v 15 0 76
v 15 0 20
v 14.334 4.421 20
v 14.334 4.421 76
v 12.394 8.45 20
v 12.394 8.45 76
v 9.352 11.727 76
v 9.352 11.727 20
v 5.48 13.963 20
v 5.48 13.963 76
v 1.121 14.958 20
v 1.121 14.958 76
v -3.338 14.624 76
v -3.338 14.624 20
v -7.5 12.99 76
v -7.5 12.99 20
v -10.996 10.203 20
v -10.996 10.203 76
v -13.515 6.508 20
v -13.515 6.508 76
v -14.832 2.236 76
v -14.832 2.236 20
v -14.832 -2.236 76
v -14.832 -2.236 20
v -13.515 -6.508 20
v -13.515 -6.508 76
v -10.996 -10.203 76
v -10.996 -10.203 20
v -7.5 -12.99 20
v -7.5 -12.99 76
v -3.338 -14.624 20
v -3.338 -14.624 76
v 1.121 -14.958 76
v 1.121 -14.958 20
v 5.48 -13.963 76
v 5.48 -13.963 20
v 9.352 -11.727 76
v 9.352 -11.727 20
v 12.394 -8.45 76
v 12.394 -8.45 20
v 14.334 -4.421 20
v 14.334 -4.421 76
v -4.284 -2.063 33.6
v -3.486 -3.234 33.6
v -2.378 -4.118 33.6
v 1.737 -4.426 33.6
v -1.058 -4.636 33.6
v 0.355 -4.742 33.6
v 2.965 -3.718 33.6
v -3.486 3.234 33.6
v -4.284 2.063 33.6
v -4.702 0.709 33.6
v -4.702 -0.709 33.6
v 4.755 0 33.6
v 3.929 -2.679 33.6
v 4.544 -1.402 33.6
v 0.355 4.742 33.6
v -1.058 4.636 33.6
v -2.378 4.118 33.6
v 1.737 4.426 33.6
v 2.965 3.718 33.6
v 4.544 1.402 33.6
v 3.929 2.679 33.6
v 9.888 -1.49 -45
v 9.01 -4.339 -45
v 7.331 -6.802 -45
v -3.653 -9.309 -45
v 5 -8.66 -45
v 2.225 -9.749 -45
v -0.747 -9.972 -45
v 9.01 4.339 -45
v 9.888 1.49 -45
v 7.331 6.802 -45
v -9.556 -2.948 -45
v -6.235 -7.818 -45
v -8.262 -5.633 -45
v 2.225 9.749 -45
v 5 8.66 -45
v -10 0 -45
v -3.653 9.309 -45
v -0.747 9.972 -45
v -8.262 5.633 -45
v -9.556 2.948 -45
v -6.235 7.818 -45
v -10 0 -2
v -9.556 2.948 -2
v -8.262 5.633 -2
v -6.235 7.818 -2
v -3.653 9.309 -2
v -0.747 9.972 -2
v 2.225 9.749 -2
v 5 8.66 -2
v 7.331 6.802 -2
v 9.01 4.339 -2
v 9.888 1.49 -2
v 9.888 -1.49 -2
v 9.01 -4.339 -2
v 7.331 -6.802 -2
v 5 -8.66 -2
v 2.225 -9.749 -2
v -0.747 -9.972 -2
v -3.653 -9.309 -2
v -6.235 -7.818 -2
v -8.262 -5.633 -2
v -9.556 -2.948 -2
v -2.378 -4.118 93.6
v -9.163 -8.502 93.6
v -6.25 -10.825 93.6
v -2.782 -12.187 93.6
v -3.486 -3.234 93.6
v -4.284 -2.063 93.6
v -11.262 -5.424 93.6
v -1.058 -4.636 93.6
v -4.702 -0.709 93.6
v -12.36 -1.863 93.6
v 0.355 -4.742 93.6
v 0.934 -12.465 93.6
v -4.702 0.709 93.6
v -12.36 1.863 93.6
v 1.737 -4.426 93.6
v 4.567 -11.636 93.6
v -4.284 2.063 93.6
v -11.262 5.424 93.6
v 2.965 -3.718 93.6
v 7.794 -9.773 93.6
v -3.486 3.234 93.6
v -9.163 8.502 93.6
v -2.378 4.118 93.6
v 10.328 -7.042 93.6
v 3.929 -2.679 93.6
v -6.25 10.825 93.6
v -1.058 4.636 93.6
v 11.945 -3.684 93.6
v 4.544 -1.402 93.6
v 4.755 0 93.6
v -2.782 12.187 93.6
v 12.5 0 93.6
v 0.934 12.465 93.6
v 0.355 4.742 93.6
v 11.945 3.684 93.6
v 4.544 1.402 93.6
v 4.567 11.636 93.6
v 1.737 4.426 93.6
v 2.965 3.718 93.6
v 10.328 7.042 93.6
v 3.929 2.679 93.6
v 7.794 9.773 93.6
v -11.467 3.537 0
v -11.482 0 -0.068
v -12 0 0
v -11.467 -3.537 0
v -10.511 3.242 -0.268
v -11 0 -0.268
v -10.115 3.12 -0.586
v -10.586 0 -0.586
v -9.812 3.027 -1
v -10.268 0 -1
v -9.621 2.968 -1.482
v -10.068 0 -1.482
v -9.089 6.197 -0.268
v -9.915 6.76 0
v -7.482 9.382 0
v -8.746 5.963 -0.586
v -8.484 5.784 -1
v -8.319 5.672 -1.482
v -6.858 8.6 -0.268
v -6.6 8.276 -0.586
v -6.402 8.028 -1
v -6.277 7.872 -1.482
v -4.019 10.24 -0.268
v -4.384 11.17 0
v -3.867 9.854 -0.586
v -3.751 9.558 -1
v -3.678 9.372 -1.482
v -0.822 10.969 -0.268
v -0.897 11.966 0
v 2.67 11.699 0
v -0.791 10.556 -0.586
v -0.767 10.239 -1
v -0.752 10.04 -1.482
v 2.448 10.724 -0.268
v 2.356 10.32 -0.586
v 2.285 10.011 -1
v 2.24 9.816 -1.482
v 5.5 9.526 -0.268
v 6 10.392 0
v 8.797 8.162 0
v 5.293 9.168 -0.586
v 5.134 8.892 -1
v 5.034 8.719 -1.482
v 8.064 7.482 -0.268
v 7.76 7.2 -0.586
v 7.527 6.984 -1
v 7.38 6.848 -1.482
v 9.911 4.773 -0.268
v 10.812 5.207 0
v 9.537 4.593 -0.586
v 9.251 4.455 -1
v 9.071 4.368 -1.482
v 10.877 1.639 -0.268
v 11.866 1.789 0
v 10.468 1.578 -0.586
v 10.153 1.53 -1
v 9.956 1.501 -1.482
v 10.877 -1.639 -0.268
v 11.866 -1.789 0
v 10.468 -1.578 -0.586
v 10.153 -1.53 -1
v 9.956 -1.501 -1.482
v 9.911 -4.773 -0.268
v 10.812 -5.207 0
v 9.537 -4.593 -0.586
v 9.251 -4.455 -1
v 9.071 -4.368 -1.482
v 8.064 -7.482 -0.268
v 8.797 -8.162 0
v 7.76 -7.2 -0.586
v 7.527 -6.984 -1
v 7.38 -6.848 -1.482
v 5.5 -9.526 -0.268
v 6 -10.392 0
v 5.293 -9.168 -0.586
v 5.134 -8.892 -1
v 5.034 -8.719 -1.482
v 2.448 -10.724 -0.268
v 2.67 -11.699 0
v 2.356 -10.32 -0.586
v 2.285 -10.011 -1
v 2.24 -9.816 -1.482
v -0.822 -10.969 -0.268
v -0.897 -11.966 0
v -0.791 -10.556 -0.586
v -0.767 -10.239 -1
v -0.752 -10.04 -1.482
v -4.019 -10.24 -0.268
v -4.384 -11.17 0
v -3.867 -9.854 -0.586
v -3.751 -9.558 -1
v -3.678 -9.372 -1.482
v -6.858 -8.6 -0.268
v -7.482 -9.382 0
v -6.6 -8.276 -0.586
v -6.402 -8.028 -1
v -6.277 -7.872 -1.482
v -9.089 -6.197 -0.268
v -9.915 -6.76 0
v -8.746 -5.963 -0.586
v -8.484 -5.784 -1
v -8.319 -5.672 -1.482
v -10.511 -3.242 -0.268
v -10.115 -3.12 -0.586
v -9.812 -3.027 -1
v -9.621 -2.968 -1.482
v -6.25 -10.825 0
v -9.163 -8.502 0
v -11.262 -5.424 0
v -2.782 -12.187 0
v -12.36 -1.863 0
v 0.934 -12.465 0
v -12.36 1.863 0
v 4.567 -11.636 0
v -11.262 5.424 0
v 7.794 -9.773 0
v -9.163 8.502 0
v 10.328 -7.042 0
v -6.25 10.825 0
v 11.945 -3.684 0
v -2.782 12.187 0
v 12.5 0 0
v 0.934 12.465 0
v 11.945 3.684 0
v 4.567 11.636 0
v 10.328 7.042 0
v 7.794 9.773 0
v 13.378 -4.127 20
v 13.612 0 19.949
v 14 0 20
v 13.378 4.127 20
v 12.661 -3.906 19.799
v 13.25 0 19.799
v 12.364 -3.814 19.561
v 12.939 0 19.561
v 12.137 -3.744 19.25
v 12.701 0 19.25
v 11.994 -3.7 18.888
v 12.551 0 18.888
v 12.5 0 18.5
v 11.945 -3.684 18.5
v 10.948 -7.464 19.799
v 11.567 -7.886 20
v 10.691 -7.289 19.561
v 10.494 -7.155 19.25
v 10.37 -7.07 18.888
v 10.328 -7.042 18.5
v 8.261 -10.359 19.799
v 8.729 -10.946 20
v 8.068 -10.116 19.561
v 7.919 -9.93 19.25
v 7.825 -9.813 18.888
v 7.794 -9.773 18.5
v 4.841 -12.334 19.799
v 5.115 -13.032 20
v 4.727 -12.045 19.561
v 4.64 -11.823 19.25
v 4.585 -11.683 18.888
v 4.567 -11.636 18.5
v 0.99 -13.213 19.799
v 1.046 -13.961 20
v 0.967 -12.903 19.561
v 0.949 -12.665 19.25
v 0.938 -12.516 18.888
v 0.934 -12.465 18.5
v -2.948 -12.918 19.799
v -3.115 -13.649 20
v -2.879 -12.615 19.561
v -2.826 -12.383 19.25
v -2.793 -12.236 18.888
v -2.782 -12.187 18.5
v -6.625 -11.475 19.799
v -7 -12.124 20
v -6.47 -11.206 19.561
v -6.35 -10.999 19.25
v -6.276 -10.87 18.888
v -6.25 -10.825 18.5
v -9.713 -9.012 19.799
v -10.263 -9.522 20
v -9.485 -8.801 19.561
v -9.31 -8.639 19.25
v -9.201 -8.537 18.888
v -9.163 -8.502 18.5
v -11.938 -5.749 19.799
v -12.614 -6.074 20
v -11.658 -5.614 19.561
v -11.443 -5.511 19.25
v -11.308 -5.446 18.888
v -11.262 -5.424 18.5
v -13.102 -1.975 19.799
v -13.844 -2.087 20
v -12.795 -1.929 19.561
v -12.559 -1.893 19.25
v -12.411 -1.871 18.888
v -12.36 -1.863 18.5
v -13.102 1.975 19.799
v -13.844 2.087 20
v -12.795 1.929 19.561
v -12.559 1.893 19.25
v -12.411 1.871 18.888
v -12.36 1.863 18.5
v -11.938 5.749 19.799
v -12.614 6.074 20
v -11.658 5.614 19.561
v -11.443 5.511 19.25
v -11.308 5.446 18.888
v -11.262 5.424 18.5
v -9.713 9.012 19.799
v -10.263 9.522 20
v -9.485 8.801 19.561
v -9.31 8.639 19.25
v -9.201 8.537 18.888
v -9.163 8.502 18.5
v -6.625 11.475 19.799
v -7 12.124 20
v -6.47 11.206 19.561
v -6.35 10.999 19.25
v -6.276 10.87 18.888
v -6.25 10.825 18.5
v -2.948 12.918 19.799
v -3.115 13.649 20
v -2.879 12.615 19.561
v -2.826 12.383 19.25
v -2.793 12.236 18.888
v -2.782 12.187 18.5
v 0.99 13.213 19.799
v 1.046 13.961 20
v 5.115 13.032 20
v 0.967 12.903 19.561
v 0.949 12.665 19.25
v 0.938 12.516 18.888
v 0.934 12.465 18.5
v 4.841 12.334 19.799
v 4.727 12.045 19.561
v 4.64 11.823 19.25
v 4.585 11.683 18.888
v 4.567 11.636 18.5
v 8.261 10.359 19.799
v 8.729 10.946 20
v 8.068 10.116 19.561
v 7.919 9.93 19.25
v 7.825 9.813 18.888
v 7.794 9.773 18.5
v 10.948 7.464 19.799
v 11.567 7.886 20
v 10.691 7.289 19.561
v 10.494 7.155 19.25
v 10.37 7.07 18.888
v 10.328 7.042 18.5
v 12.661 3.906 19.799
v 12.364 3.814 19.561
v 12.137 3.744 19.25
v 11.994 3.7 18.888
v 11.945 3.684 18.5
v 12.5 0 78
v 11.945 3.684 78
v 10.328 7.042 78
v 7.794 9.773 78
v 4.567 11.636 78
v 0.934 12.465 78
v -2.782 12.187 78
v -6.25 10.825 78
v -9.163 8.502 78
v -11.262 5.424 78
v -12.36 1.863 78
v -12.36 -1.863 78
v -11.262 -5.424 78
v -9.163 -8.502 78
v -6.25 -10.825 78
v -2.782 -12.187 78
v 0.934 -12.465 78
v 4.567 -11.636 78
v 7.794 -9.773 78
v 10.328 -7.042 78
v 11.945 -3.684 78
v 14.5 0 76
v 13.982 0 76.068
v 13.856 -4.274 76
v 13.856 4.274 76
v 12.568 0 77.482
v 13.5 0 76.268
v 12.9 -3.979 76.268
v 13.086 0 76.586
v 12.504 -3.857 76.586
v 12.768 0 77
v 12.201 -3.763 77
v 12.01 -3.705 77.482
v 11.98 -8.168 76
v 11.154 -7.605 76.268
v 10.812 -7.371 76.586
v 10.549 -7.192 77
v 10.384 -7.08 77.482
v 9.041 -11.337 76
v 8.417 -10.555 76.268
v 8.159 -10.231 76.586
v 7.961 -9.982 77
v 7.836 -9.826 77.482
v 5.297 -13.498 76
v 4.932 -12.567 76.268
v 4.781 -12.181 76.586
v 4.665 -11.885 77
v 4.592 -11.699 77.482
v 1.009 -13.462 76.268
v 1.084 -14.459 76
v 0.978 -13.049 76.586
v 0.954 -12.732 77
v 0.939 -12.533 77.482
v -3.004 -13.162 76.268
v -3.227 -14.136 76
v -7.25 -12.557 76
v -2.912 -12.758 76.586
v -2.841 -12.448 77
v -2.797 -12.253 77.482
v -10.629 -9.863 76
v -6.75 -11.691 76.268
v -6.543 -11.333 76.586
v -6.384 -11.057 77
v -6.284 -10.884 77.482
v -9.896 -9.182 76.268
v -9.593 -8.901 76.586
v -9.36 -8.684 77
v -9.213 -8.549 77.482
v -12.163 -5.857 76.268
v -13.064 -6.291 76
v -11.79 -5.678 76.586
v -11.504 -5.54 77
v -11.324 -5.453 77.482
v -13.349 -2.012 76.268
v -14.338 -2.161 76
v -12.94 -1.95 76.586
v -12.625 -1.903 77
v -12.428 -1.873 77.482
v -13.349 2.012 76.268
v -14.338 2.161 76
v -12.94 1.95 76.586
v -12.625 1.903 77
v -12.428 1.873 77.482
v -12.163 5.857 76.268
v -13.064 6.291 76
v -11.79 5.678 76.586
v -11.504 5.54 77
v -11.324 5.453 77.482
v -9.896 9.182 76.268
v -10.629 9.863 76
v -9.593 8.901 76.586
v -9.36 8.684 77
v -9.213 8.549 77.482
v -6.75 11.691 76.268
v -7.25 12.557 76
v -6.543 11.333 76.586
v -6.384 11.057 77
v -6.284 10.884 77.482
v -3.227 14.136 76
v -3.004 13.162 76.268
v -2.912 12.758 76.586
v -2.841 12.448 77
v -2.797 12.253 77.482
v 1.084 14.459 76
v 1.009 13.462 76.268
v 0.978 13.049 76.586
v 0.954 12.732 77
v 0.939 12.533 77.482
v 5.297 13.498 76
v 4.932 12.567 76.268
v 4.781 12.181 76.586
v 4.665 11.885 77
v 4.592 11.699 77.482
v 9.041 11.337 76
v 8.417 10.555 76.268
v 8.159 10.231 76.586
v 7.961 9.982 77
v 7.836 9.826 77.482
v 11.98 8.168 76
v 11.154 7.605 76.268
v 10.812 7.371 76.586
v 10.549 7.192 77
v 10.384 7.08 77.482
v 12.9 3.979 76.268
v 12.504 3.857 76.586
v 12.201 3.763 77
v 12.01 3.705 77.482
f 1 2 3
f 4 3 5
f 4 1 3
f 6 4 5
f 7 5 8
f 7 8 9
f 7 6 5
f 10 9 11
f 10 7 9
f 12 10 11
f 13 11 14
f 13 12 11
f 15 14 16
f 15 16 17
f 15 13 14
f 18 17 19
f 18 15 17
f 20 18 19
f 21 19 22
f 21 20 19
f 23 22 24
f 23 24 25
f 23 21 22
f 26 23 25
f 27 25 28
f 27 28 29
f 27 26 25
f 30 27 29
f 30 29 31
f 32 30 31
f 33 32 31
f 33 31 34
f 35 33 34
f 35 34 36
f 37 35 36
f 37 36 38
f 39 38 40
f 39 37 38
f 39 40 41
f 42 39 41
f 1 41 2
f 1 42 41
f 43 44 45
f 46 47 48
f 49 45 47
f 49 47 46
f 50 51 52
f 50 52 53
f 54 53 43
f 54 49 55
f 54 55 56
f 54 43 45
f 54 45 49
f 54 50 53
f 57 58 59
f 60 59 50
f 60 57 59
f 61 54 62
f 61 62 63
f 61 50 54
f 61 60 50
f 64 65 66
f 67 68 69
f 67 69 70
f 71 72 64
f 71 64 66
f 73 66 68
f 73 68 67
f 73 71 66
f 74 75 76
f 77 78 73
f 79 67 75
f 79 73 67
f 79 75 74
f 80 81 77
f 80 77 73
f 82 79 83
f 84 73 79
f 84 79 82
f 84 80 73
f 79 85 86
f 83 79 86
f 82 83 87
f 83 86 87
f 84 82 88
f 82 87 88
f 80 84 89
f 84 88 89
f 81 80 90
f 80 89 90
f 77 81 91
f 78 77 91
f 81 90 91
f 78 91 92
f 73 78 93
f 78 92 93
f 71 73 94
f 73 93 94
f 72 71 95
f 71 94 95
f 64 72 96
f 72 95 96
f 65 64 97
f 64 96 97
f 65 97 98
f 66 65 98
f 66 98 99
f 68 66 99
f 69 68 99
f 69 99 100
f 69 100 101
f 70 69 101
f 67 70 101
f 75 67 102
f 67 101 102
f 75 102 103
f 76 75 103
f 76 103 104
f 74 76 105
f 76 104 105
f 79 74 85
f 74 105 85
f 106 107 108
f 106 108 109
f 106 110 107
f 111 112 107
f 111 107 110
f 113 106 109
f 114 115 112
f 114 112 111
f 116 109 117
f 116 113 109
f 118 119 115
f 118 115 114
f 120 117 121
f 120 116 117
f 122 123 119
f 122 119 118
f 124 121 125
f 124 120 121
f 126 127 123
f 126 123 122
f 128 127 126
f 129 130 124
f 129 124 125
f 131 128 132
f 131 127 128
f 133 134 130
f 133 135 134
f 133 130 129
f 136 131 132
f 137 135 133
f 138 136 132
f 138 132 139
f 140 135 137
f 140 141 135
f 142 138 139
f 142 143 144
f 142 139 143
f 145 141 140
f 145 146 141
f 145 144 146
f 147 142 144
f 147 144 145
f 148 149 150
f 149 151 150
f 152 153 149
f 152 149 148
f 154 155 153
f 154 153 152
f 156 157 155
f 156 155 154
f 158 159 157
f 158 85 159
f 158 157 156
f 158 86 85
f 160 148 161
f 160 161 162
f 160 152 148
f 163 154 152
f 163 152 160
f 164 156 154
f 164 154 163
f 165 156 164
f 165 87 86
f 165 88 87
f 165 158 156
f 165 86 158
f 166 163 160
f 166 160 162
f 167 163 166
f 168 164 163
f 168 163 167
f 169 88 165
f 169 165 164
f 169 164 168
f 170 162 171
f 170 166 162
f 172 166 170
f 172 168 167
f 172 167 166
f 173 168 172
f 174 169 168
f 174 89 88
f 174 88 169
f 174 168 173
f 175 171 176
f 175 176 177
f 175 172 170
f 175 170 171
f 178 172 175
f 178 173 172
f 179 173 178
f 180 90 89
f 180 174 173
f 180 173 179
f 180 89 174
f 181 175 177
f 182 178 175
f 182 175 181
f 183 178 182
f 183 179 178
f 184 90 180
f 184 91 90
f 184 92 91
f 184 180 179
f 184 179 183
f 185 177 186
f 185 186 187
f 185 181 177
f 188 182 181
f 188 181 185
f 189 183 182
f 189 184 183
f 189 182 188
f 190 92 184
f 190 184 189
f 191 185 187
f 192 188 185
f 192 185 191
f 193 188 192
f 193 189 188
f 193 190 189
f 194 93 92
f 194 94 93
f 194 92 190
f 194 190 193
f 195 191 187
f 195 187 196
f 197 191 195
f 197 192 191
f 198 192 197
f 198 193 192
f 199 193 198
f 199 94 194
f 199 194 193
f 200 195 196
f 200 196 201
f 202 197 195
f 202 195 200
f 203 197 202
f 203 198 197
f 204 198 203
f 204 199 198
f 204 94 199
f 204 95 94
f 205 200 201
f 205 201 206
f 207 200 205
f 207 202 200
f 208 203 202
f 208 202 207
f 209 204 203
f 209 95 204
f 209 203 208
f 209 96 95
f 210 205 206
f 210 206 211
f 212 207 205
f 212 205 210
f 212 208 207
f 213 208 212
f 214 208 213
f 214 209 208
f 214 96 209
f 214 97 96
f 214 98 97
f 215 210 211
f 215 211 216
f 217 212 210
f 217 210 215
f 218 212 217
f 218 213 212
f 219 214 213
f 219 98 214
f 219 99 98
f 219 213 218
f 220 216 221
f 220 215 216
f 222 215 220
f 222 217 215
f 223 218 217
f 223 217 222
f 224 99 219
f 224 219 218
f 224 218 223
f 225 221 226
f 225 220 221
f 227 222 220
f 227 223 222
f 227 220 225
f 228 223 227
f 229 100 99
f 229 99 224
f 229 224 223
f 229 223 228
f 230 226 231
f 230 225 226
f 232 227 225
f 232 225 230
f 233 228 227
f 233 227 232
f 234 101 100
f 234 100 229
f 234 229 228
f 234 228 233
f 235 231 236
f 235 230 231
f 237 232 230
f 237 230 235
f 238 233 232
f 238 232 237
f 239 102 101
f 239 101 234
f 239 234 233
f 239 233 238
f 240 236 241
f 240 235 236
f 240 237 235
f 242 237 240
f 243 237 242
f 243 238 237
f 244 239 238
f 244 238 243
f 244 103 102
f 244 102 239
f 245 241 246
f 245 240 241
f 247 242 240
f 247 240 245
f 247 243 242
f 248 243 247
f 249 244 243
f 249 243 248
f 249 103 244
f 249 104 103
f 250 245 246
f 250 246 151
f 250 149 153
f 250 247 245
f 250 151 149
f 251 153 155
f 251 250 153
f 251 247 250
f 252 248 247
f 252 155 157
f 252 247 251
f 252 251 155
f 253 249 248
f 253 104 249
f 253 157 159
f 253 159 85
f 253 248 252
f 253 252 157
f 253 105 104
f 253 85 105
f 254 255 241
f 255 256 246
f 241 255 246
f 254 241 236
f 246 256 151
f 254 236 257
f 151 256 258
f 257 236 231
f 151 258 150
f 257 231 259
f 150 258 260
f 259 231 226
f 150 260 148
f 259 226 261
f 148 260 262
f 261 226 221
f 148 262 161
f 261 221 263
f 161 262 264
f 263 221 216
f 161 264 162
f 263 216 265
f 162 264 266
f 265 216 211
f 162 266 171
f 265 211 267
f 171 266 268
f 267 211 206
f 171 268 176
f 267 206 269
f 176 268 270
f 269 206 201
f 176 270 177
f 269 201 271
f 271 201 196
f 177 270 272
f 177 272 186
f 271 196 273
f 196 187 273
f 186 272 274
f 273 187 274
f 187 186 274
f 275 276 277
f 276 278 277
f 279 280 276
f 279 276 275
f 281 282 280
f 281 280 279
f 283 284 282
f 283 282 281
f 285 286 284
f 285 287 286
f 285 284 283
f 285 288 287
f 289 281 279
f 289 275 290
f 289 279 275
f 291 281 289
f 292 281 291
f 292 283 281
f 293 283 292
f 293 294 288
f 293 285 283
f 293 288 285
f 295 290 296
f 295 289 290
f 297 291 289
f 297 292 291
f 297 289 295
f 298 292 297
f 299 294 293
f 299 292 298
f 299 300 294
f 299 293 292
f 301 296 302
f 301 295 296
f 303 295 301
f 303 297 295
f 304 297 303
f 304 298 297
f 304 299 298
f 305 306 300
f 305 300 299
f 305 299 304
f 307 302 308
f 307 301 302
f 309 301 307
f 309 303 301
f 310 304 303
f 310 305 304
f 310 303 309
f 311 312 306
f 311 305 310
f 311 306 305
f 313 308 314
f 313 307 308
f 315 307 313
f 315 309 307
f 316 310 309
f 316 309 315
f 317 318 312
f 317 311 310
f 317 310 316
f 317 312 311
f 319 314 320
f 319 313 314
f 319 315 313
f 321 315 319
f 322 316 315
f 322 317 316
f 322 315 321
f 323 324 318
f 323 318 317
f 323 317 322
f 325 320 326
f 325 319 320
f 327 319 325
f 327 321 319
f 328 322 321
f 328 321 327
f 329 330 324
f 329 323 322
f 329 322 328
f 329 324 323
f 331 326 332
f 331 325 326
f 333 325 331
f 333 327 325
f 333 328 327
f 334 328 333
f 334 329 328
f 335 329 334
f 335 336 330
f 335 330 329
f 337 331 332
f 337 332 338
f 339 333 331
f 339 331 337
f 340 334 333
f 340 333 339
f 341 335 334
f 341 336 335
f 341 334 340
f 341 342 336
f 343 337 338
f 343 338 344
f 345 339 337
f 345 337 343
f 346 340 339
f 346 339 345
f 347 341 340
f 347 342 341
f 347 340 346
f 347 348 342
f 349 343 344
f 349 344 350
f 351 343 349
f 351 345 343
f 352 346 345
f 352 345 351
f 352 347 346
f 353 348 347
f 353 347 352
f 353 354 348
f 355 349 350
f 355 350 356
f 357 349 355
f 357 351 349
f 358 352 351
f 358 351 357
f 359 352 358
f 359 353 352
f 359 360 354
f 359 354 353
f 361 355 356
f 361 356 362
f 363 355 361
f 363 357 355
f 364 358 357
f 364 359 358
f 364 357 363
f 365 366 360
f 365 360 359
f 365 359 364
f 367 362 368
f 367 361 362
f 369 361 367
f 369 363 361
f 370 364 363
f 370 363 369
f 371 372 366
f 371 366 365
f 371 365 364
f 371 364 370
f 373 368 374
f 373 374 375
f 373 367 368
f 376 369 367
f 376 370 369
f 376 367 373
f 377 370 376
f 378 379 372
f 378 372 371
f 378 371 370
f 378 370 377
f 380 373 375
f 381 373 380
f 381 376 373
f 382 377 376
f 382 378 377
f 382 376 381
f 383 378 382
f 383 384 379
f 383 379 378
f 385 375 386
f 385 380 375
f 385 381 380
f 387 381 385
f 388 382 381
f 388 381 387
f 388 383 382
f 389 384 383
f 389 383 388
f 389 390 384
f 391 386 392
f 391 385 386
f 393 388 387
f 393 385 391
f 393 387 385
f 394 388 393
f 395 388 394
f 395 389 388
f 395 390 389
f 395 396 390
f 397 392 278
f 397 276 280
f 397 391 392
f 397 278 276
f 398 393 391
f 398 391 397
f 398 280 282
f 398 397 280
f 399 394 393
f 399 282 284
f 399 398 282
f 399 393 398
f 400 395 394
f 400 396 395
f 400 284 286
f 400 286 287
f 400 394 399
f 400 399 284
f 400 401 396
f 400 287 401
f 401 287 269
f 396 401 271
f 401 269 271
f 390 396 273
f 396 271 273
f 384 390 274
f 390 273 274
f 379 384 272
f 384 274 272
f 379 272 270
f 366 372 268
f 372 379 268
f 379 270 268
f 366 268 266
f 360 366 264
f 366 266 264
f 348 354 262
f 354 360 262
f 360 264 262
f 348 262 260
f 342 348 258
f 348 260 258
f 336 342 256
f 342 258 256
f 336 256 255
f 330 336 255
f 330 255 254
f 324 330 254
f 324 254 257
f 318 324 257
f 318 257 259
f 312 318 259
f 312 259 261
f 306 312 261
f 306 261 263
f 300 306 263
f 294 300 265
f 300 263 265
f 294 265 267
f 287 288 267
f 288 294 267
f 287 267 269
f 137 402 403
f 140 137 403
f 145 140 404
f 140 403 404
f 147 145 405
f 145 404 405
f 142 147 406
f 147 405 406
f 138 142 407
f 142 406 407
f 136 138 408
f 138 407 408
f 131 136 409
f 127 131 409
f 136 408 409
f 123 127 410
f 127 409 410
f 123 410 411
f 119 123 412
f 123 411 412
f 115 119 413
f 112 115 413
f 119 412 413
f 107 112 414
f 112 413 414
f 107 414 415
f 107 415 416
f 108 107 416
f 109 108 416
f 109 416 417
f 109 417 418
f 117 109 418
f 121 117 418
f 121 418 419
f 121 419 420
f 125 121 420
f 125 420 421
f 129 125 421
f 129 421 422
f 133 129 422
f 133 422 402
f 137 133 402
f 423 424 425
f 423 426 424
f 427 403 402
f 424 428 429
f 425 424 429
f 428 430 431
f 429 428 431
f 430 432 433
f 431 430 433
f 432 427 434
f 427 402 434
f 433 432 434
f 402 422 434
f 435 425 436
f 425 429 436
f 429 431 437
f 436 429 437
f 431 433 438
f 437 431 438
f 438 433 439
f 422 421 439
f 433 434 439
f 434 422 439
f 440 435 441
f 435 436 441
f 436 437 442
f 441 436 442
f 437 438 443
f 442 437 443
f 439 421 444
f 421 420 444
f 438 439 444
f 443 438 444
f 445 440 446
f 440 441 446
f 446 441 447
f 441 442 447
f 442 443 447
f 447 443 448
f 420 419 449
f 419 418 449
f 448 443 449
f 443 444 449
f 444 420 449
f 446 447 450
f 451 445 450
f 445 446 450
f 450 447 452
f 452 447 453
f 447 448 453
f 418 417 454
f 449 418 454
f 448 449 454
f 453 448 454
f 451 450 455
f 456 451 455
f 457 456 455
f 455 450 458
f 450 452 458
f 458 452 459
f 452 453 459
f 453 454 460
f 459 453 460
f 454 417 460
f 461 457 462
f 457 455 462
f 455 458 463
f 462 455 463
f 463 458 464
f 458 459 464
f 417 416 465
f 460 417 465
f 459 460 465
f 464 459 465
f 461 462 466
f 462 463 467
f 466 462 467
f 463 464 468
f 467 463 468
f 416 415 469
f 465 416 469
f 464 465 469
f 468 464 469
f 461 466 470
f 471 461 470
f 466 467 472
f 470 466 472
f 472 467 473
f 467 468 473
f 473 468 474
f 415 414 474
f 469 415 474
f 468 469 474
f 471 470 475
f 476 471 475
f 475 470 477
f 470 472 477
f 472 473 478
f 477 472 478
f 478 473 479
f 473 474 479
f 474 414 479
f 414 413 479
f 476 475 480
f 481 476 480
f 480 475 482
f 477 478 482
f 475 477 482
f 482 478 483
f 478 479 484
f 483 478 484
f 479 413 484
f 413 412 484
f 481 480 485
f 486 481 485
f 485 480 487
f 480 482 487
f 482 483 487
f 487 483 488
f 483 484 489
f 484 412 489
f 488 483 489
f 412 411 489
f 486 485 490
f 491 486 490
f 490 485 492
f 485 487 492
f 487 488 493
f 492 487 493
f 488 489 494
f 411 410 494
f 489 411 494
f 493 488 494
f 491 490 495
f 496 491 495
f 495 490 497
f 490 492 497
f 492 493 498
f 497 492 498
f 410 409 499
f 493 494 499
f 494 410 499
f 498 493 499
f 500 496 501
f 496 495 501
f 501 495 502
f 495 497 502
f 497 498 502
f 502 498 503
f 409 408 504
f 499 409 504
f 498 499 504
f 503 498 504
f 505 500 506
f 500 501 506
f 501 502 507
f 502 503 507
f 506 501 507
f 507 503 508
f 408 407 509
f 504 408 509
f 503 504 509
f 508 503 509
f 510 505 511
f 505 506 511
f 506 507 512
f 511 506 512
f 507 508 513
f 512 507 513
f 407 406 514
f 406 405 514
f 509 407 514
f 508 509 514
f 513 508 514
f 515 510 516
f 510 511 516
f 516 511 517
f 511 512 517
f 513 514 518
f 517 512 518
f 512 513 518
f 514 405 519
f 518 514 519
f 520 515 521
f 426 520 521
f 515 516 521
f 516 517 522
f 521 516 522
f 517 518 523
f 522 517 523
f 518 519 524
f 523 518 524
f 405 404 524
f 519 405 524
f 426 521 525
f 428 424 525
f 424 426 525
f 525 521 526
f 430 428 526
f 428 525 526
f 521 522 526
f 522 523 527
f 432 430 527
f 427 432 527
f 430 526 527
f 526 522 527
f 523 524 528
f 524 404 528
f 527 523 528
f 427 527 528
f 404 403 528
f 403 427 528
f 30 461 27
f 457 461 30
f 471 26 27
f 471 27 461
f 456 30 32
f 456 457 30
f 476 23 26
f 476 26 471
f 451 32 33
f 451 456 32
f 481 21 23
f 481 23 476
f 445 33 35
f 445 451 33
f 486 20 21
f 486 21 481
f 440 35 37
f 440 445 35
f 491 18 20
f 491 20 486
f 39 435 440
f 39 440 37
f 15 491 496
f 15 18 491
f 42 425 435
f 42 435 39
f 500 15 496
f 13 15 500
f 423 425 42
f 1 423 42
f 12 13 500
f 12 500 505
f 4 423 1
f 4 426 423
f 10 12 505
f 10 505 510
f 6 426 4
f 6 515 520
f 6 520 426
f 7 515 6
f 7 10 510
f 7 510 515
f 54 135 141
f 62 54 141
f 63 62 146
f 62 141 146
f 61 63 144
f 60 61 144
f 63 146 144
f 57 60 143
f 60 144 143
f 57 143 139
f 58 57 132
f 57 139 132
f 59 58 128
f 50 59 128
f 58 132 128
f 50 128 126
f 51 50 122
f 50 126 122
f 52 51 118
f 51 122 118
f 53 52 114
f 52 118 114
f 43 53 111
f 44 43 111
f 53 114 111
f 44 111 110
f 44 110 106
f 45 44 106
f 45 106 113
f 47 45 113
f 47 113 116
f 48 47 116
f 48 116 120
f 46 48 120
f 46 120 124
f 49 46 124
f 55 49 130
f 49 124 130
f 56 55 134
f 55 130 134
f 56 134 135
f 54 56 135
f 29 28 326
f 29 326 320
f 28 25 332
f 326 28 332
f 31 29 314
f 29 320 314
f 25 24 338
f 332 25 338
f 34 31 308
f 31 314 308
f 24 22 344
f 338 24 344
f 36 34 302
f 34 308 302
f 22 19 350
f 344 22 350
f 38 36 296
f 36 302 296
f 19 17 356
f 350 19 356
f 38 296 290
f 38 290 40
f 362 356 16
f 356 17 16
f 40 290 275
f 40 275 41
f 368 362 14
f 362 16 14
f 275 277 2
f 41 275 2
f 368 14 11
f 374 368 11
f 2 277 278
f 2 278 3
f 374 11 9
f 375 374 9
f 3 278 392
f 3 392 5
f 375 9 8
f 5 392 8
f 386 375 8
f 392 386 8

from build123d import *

# Parameters (mm, degrees)
SKETCH1_R           = 12.5
BOSS_EXTRUDE1_DEPTH = 93.6
SKETCH2_R           = 15
BOSS_EXTRUDE2_DEPTH = 56
SKETCH3_R           = 10
BOSS_EXTRUDE3_DEPTH = 45
SKETCH4_R           = 4.755
CUT_EXTRUDE1_DEPTH  = 60
FILLET2_R           = 2
FILLET3_R           = 1.5
FILLET4_R           = 2


with BuildPart() as part:
    # Sketch1 → Boss-Extrude1 (new body)
    with BuildSketch(Plane.XY):
        Circle(SKETCH1_R)
    extrude(amount=BOSS_EXTRUDE1_DEPTH)

    # Sketch2 → Boss-Extrude2 (add)
    with BuildSketch(Plane.XY.offset(76)):
        Circle(SKETCH2_R)
    extrude(amount=-BOSS_EXTRUDE2_DEPTH)

    # Sketch3 → Boss-Extrude3 (add)
    with BuildSketch(Plane(origin=(0, 0, 0), x_dir=(-1, 0, 0), z_dir=(0, 0, -1))):
        Circle(SKETCH3_R)
    extrude(amount=BOSS_EXTRUDE3_DEPTH)

    # Sketch4 → Cut-Extrude1 (cut)
    with BuildSketch(Plane.XY.offset(93.6)):
        Circle(SKETCH4_R)
    extrude(amount=-CUT_EXTRUDE1_DEPTH, mode=Mode.SUBTRACT)

    # Fillet2
    fillet2_edges = [part.edges().sort_by_distance(p)[0] for p in [
        (-12.5, 0, 76),
    ]]
    fillet(fillet2_edges, radius=FILLET2_R)

    # Fillet3
    fillet3_edges = [part.edges().sort_by_distance(p)[0] for p in [
        (-12.5, 0, 20),
    ]]
    fillet(fillet3_edges, radius=FILLET3_R)

    # Fillet4
    fillet4_edges = [part.edges().sort_by_distance(p)[0] for p in [
        (10, 0, 0),
    ]]
    fillet(fillet4_edges, radius=FILLET4_R)


solid = part.part
